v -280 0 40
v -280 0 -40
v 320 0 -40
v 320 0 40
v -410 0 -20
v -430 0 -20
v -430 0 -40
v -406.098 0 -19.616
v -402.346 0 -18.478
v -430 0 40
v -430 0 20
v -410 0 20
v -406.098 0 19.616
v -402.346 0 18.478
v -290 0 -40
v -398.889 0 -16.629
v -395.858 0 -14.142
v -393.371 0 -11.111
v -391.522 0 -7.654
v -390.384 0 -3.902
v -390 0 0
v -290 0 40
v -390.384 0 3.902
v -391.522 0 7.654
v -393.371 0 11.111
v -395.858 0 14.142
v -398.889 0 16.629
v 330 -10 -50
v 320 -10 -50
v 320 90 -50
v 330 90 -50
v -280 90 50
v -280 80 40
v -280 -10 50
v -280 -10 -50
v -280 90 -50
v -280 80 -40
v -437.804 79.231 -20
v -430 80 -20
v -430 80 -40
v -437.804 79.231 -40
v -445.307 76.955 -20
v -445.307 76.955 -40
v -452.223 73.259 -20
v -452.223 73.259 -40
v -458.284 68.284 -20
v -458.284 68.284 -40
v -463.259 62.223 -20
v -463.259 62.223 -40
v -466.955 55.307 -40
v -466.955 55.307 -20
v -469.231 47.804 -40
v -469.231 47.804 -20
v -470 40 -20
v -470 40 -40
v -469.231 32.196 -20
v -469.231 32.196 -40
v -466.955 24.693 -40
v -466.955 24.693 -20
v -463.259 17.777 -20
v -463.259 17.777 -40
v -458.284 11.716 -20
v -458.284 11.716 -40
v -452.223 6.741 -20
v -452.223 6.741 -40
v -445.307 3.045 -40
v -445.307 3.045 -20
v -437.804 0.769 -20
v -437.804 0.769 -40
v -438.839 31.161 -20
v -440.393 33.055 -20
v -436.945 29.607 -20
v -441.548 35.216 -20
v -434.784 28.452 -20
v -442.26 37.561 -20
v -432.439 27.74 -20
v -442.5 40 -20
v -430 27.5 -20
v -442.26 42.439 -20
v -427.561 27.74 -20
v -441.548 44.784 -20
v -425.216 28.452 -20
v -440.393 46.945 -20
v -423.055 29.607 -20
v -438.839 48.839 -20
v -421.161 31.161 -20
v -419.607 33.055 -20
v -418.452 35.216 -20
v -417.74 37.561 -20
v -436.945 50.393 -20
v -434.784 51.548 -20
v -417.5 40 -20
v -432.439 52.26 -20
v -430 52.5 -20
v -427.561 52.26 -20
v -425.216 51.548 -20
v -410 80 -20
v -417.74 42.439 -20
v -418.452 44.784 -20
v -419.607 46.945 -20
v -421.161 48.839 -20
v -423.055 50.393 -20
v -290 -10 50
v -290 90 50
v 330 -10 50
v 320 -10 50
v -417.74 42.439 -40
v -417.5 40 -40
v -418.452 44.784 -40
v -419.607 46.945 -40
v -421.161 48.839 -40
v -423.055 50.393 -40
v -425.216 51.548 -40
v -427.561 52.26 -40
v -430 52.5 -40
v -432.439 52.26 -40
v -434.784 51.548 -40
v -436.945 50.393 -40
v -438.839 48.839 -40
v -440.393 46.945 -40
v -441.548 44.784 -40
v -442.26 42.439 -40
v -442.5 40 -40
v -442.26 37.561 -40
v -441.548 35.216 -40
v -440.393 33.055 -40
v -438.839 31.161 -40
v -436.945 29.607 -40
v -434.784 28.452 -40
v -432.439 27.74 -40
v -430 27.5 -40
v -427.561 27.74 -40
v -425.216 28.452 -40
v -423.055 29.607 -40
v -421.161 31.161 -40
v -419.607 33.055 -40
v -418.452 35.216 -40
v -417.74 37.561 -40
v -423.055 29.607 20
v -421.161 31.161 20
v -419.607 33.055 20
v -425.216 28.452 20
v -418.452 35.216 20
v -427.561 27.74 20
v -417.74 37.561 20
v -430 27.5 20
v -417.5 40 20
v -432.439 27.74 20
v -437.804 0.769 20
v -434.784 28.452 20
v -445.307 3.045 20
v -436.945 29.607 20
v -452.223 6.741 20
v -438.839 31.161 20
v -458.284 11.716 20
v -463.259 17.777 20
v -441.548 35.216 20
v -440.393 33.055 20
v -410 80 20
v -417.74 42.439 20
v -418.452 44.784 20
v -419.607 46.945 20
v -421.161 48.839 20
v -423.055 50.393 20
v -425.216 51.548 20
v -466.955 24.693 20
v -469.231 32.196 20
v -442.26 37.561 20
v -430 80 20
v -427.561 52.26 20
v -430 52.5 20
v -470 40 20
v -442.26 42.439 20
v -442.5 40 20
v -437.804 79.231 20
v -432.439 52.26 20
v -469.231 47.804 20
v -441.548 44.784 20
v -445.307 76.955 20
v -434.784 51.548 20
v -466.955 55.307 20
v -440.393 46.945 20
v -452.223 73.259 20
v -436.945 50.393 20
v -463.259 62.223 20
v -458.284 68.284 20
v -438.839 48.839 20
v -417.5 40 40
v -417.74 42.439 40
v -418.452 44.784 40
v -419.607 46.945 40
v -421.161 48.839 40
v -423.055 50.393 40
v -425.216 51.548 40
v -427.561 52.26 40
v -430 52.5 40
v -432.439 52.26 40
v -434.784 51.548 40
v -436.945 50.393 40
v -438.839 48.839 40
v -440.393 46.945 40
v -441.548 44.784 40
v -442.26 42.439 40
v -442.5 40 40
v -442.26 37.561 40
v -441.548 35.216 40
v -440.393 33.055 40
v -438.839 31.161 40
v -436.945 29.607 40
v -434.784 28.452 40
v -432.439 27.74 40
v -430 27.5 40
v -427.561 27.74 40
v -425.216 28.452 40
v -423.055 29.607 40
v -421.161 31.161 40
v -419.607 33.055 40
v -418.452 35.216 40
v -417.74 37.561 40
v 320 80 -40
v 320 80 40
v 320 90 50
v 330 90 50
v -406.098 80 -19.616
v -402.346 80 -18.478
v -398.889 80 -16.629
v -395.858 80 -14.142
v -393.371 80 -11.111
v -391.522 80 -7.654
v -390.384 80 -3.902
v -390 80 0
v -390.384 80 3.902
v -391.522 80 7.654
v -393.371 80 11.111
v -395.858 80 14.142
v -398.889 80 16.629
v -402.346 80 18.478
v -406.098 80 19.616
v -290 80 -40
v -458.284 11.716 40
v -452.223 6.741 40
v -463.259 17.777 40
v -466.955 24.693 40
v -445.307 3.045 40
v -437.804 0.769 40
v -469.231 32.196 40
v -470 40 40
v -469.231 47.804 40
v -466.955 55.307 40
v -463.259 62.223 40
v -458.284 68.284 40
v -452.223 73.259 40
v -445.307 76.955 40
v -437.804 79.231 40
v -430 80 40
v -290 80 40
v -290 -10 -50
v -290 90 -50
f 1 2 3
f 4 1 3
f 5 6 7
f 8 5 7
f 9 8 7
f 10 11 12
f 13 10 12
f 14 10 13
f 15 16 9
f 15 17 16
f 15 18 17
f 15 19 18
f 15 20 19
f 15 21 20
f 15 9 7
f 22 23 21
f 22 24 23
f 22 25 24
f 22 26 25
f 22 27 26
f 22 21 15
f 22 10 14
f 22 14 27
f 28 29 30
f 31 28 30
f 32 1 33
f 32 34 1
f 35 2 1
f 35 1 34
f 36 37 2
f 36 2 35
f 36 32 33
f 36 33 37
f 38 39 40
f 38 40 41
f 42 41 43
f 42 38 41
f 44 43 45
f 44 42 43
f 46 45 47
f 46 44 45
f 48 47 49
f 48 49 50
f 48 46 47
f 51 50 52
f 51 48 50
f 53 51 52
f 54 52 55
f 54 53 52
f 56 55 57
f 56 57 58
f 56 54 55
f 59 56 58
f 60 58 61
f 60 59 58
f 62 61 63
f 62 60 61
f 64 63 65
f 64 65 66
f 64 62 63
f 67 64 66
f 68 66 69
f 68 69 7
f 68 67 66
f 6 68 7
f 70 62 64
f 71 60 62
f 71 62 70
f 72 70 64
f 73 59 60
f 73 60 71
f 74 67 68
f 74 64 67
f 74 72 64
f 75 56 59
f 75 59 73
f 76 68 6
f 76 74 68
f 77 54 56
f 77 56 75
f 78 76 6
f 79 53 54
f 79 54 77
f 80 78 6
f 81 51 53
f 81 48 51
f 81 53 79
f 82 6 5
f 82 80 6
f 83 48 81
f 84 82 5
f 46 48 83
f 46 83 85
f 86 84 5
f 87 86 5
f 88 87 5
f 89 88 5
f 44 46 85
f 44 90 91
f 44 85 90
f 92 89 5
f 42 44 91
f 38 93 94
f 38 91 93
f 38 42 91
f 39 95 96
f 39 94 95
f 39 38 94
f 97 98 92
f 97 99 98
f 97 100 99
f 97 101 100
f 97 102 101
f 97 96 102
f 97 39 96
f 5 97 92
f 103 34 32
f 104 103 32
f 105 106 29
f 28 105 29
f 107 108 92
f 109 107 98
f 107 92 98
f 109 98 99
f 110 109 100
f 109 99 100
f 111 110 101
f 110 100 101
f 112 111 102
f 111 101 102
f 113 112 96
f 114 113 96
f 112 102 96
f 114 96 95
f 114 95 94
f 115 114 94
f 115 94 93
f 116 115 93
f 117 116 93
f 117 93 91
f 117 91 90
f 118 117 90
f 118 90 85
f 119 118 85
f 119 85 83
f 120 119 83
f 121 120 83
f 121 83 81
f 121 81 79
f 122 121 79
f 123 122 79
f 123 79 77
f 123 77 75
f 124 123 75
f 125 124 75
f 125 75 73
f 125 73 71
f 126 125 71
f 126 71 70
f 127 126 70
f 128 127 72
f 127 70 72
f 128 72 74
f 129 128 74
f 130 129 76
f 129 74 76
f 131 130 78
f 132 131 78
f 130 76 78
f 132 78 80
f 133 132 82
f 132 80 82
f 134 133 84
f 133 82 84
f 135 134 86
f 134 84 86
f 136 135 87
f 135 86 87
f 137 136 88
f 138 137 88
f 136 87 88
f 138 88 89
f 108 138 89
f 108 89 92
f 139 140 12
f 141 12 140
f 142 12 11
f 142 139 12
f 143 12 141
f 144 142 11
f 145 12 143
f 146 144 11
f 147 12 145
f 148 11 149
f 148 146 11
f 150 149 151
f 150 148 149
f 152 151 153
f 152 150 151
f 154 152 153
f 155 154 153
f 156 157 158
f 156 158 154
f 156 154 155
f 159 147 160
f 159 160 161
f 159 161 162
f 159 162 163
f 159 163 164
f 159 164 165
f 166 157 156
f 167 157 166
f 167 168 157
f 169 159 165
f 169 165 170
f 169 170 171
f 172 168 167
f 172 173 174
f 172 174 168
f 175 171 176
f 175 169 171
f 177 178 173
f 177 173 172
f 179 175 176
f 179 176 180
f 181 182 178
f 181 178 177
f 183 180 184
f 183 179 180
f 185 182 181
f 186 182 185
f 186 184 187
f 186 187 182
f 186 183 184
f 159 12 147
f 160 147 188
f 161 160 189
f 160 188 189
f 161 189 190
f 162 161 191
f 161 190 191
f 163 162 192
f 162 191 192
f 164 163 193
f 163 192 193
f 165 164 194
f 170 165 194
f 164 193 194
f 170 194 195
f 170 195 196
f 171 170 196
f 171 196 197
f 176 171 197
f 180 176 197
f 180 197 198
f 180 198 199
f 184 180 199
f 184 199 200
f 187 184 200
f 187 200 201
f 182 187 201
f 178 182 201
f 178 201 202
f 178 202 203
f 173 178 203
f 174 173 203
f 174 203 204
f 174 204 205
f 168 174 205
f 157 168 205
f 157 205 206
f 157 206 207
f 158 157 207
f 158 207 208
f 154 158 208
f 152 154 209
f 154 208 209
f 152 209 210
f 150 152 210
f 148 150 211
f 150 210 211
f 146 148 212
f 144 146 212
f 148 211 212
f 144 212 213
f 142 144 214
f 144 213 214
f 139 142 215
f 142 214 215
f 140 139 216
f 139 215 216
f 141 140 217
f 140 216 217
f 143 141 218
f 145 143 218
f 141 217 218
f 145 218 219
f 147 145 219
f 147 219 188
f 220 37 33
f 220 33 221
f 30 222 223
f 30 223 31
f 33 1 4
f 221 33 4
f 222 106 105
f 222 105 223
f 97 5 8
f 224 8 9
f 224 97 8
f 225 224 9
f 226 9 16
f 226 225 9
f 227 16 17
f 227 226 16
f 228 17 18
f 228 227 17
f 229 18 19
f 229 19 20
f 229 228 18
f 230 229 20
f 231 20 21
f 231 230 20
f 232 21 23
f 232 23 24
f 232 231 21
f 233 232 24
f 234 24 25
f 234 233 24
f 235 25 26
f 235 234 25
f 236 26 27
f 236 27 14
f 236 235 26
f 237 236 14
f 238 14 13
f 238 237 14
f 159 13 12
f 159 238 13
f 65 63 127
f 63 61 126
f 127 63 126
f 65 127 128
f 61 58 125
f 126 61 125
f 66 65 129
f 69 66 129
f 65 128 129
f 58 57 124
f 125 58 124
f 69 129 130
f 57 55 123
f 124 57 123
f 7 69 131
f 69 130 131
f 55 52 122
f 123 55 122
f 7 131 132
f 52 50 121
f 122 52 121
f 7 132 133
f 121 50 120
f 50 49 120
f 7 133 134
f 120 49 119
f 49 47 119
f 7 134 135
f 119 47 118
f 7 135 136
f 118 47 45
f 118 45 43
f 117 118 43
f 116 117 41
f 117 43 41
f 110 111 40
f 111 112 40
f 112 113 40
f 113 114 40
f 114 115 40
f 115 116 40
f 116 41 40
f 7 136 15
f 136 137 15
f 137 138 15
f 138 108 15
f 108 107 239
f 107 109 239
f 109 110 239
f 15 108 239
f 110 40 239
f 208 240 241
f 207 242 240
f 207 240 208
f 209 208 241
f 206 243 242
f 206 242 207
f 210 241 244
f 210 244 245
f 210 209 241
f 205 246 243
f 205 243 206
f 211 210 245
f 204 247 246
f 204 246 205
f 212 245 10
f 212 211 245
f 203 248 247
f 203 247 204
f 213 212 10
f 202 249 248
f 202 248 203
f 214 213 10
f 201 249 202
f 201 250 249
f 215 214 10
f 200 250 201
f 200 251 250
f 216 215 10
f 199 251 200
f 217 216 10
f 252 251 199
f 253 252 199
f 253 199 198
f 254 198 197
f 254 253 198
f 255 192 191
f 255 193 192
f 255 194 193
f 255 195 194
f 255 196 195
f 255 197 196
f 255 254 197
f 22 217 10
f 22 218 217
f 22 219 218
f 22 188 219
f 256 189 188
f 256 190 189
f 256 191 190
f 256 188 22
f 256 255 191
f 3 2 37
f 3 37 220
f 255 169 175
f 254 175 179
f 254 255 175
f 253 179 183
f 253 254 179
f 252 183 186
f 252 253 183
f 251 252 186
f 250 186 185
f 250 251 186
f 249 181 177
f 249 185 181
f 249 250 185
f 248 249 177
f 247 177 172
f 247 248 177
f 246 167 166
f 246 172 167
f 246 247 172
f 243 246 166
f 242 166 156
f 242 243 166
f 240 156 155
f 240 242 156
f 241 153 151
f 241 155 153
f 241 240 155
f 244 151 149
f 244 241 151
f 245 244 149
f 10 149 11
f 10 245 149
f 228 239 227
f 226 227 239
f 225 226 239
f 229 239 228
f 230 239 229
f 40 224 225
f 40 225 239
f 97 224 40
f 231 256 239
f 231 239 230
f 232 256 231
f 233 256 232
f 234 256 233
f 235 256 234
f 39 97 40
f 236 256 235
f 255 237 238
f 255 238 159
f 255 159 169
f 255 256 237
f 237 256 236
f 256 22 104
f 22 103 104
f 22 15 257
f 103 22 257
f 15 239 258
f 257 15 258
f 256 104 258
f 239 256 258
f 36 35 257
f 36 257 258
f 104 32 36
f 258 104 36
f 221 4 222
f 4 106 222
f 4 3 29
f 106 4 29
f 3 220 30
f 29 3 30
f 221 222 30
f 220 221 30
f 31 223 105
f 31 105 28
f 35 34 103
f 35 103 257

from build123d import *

# Parameters (mm, degrees)
SKETCH1_W           = 660
SKETCH1_H           = 80
BOSS_EXTRUDE1_DEPTH = 80
BOSS_EXTRUDE2_START = 320
SKETCH2_W           = 100
SKETCH2_H           = 100
BOSS_EXTRUDE2_DEPTH = 10
BOSS_EXTRUDE3_START = -280
SKETCH2_2_W         = 100
SKETCH2_2_H         = 100
BOSS_EXTRUDE3_DEPTH = 10
BOSS_EXTRUDE4_START = -290
SKETCH2_4_W         = 80
SKETCH2_4_H         = 80
BOSS_EXTRUDE4_DEPTH = 100
SKETCH4_R           = 12.5
BOSS_EXTRUDE5_DEPTH = 80
CUT_EXTRUDE1_DEPTH  = 80


with BuildPart() as part:
    # Sketch1 → Boss-Extrude1 (new body)
    with BuildSketch(Plane(origin=(0, 0, 0), x_dir=(1, 0, 0), z_dir=(0, 1, 0))):
        Rectangle(SKETCH1_W, SKETCH1_H)
    extrude(amount=BOSS_EXTRUDE1_DEPTH)

    # Sketch2 → Boss-Extrude2 (add)
    with BuildSketch(Plane(origin=(0, 0, 0), x_dir=(0, 0, -1), z_dir=(1, 0, 0)).offset(BOSS_EXTRUDE2_START)):
        with Locations((0, 40)):
            Rectangle(SKETCH2_W, SKETCH2_H)
    extrude(amount=BOSS_EXTRUDE2_DEPTH)

    # Sketch2<2> → Boss-Extrude3 (add)
    with BuildSketch(Plane(origin=(0, 0, 0), x_dir=(0, 0, -1), z_dir=(1, 0, 0)).offset(BOSS_EXTRUDE3_START)):
        with Locations((0, 40)):
            Rectangle(SKETCH2_2_W, SKETCH2_2_H)
    extrude(amount=-BOSS_EXTRUDE3_DEPTH)

    # Sketch2<4> → Boss-Extrude4 (add)
    with BuildSketch(Plane(origin=(0, 0, 0), x_dir=(0, 0, -1), z_dir=(1, 0, 0)).offset(BOSS_EXTRUDE4_START)):
        with Locations((0, 40)):
            Rectangle(SKETCH2_4_W, SKETCH2_4_H)
    extrude(amount=-BOSS_EXTRUDE4_DEPTH)

    # Sketch4 → Boss-Extrude5 (add)
    with BuildSketch(Plane.XY.offset(40)):
        with BuildLine():
            Line((-430, 0), (-390, 0))
            Line((-390, 0), (-390, 80))
            Line((-390, 80), (-430, 80))
            ThreePointArc((-430, 80), (-470, 40), (-430, 0))
        make_face()
        with Locations((-430, 40)):
            Circle(SKETCH4_R, mode=Mode.SUBTRACT)
    extrude(amount=-BOSS_EXTRUDE5_DEPTH)

    # Sketch5 → Cut-Extrude1 (cut)
    with BuildSketch(Plane(origin=(0, 80, 0), x_dir=(1, 0, 0), z_dir=(0, 1, 0))):
        with BuildLine():
            Line((-470, 20), (-430, 20))
            Line((-430, 20), (-410, 20))
            ThreePointArc((-410, 20), (-390, 0), (-410, -20))
            Line((-410, -20), (-430, -20))
            Line((-430, -20), (-470, -20))
            Line((-470, -20), (-470, 20))
        make_face()
    extrude(amount=-CUT_EXTRUDE1_DEPTH, mode=Mode.SUBTRACT)


solid = part.part
